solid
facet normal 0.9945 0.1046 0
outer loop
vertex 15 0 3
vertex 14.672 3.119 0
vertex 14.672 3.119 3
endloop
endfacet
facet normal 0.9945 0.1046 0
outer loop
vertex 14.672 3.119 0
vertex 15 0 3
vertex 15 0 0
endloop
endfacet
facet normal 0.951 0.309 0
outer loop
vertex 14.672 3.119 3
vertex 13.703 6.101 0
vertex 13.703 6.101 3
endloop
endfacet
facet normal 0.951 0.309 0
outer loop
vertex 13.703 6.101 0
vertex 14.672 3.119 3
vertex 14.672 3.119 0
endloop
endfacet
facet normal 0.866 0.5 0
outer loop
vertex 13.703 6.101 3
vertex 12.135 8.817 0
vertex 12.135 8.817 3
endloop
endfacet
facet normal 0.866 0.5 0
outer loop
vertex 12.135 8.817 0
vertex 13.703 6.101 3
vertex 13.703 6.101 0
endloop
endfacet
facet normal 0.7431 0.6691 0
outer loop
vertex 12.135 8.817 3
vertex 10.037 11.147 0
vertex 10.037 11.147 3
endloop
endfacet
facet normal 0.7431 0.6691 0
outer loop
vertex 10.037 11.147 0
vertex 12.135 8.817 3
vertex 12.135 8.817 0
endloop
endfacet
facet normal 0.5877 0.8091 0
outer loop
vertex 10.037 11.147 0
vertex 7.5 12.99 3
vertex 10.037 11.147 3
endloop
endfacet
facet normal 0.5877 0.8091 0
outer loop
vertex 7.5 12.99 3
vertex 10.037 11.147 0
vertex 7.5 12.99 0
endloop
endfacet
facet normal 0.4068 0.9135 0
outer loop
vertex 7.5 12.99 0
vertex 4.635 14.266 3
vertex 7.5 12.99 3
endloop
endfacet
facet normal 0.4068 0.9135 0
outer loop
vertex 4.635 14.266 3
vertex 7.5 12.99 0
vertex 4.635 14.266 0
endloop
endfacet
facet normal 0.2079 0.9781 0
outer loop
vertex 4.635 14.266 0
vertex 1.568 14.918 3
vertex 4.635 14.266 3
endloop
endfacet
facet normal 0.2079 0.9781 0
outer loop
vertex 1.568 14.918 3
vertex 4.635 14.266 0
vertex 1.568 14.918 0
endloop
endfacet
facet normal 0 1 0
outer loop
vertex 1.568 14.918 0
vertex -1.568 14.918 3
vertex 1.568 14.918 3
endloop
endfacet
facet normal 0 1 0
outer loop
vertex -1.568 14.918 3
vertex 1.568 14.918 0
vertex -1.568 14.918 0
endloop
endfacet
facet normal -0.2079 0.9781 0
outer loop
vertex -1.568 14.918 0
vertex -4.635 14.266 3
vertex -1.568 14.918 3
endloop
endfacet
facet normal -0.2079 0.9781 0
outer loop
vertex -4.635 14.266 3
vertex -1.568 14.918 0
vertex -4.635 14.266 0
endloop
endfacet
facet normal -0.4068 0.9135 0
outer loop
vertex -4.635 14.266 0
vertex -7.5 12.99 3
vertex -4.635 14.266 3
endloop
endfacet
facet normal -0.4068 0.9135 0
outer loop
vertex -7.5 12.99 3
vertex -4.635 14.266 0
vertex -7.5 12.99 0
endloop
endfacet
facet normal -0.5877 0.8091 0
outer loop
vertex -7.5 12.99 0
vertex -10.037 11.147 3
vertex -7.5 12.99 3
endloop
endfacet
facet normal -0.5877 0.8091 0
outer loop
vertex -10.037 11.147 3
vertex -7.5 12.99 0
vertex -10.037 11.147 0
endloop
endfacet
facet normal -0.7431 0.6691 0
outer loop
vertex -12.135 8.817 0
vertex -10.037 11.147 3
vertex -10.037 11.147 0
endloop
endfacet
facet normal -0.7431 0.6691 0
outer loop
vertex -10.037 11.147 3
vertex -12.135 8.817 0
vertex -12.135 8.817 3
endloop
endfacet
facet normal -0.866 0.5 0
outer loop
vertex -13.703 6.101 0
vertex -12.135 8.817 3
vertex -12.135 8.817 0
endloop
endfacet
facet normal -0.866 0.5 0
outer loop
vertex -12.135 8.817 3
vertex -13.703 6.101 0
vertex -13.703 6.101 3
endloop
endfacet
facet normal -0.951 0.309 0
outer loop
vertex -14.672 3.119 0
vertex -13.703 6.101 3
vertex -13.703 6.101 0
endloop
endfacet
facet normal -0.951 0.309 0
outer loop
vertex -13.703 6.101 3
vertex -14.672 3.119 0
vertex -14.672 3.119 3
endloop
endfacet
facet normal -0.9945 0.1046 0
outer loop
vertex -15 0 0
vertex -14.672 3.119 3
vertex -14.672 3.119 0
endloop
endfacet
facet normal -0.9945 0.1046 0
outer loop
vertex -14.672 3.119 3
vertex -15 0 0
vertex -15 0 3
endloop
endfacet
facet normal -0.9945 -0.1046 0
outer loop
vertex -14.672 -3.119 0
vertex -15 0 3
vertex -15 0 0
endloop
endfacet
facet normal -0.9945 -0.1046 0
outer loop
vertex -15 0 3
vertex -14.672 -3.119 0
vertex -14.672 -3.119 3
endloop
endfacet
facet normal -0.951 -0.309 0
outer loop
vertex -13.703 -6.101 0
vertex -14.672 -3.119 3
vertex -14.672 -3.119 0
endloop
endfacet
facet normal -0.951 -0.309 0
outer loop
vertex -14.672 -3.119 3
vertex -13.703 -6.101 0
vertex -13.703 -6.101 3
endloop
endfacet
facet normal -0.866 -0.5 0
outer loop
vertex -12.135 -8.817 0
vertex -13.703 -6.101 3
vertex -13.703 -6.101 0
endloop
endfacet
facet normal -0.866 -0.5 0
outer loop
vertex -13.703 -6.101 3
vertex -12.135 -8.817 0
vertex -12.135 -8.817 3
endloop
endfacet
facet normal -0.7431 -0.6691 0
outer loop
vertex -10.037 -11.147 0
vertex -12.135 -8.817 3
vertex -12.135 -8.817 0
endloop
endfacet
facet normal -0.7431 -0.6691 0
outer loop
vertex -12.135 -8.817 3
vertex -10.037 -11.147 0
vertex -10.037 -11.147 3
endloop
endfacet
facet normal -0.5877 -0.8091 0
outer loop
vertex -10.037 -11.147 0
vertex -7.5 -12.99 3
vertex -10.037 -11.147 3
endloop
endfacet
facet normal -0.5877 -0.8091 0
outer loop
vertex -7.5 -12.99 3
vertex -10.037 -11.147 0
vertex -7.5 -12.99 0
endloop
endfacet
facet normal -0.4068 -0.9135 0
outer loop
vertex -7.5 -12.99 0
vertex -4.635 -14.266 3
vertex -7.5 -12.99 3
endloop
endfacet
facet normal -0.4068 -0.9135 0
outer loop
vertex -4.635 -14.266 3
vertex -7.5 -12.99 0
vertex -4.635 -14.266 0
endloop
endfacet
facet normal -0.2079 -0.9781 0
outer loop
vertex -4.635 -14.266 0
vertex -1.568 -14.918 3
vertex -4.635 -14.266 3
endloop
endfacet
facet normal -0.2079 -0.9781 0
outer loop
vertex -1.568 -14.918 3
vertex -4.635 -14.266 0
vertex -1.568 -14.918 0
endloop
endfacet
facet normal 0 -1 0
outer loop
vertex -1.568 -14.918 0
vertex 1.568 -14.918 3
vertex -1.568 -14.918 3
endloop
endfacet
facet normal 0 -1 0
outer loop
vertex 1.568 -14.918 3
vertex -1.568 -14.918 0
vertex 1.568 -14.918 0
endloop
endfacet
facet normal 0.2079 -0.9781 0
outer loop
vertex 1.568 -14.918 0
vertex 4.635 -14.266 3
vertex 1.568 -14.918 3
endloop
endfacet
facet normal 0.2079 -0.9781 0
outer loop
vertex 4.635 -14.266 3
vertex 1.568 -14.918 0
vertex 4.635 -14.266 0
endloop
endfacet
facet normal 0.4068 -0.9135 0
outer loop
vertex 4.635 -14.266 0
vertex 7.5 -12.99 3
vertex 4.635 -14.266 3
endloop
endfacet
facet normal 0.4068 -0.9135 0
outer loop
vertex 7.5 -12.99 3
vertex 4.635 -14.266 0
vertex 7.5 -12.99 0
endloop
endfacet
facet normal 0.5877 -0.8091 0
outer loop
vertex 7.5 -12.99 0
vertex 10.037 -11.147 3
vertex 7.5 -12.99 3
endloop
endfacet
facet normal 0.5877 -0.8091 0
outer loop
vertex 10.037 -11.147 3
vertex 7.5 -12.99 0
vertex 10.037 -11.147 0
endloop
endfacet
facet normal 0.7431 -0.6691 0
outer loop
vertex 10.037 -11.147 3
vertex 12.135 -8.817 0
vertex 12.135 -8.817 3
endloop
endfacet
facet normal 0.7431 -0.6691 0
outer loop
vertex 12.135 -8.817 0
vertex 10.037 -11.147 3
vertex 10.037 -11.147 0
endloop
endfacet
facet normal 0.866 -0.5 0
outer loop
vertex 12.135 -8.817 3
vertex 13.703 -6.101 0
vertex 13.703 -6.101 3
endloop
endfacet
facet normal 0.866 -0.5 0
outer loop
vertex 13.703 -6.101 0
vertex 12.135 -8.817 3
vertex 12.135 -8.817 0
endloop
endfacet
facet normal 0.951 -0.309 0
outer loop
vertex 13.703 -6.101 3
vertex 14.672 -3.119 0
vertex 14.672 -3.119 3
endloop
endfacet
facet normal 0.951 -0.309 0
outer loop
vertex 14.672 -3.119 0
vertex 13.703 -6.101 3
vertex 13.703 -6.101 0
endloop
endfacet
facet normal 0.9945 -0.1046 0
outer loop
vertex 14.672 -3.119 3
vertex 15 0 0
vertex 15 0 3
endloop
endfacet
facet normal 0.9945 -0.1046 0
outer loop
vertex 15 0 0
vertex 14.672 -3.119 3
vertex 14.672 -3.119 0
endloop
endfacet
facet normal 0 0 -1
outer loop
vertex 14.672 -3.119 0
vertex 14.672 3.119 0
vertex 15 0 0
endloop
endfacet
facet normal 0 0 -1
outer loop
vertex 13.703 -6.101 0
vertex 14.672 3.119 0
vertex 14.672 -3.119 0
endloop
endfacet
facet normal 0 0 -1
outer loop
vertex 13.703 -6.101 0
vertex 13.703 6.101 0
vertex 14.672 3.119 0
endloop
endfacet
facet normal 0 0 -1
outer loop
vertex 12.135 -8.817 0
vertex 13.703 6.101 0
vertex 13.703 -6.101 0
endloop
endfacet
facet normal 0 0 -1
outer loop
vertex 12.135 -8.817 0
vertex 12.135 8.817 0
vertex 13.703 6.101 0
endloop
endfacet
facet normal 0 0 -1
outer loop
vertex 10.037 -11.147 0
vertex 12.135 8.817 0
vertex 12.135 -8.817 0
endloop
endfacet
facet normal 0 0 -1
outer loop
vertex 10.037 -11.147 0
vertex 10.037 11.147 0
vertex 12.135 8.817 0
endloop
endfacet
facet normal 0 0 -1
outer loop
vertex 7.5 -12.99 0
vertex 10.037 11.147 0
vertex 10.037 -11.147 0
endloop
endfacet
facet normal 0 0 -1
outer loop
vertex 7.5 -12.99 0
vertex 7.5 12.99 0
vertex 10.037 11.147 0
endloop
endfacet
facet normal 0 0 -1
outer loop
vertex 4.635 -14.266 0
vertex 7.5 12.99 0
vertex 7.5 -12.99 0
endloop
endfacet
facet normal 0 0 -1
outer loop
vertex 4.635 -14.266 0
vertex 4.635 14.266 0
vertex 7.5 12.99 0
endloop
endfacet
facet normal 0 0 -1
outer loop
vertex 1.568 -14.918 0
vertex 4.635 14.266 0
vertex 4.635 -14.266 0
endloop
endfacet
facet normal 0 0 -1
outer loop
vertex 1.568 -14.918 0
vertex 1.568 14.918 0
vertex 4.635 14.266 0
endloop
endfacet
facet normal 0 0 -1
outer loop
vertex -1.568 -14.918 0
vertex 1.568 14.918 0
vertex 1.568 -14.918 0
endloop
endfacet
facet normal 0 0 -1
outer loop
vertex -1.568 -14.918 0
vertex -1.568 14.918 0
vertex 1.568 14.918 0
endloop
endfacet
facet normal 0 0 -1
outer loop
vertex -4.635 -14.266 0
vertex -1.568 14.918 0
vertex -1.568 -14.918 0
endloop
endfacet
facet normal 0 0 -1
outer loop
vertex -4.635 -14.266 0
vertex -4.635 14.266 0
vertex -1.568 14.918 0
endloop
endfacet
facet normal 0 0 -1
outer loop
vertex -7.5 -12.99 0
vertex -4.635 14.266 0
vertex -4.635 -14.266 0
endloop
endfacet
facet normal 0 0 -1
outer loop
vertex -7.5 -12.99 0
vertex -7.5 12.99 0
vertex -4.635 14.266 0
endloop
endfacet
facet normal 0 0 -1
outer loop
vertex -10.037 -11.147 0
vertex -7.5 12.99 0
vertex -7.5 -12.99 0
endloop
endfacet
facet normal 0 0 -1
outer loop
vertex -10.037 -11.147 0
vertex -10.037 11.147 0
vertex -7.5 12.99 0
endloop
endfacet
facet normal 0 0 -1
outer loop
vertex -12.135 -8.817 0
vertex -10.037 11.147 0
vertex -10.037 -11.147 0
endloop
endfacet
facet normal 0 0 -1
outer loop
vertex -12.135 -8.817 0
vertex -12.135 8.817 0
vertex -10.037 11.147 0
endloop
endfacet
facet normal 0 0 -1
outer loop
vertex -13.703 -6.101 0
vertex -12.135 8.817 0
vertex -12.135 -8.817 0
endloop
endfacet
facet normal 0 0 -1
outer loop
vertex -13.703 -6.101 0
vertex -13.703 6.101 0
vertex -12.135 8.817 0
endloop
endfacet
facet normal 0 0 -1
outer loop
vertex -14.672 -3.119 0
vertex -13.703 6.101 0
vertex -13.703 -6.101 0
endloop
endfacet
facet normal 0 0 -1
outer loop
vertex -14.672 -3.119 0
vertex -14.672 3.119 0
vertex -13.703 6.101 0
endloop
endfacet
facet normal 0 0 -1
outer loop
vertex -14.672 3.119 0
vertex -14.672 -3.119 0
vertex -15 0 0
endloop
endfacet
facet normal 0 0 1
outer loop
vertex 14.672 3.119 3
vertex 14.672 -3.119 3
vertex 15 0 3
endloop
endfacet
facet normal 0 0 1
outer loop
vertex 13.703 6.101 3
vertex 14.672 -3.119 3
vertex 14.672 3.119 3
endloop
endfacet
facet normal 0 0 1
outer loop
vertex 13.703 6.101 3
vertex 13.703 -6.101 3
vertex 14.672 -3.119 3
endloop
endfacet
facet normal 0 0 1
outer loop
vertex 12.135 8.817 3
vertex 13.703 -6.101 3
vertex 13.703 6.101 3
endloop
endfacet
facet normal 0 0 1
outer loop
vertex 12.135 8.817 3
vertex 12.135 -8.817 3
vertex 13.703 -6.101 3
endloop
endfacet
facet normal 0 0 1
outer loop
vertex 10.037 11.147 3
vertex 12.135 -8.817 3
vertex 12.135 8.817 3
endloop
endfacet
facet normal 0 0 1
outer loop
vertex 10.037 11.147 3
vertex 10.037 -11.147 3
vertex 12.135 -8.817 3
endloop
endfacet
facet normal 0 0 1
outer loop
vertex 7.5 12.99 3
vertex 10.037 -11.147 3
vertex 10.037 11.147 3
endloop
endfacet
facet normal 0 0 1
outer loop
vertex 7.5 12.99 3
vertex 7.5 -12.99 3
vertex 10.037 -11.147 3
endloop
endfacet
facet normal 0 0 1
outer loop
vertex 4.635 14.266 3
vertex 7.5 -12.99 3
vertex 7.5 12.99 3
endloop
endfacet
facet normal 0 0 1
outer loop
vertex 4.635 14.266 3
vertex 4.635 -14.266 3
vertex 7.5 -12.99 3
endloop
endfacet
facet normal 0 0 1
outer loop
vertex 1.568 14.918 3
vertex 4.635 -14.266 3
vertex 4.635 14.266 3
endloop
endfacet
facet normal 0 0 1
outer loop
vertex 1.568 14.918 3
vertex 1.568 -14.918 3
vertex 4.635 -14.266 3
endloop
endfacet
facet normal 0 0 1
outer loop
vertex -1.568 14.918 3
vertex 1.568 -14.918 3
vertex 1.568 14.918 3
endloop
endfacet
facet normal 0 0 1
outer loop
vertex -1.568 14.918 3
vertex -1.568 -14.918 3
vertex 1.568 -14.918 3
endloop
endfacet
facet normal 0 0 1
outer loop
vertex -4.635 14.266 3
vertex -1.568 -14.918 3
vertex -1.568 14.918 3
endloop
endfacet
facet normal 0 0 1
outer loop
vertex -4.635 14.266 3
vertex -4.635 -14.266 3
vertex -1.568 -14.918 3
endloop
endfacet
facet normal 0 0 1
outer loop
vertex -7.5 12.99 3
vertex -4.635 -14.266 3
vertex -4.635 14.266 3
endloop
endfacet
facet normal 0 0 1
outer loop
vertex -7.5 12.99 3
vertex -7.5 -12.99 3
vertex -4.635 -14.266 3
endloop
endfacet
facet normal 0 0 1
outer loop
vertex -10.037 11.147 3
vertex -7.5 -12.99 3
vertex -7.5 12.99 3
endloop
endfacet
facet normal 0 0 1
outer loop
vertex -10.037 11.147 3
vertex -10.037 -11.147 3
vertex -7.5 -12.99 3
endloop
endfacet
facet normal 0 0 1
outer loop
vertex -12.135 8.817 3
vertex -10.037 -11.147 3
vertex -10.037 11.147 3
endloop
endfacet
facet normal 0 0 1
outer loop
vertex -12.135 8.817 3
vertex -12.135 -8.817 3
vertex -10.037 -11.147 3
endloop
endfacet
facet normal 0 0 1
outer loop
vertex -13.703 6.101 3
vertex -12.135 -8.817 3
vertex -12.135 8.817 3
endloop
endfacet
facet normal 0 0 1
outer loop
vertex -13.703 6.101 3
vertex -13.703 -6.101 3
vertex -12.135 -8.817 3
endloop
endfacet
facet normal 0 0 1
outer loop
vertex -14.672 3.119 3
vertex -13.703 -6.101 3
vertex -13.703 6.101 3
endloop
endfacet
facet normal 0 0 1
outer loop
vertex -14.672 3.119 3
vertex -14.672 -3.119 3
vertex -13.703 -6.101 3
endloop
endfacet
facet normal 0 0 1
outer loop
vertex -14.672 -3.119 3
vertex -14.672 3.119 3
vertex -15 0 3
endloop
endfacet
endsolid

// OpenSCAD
// Generated by SolidPython 1.0.1 on 2020-07-29 00:39:25


cylinder(h = 3, r1 = 15, r2 = 15);
/***********************************************
*********      SolidPython code:      **********
************************************************
 
# import packages: SolidPython
from solid import *
from solid.utils import *
from itertools import chain, combinations


class Resize:

    def __init__(self, scad_file):
        self.scad_file = scad_file
        #self.scad_file = import_scad(scad_file)
        # cone/cylinder param:
        self.r1 = 0
        self.r2 = 0
        self.h = 0
        # rectangular prism param:
        self.w = 0
        self.l = 0
        # ellipse param:
        self.r = 0

    # import OpenScad code (file name corresponds to shape)


    # classify shape + parameters
    def assign(self, param1, param2, param3):
        if self.scad_file == 'cone.scad':
            self.r1 = param1
            self.r2 = param2
            self.h = param3
        elif self.scad_file == 'cylinder.scad':
            self.r1 = param1
            self.r2 = param2
            self.h = param3
        elif self.scad_file == 'rectangularPrism.scad':
            self.h = param1
            self.l = param2
            self.w = param3
        else:
            self.r = param1
            self.h = param2

    # resize parameters
    def iterate(self):
        x = range(3, 20, 2)
        i = 1
        if self.scad_file == 'cone.scad':
            tempList = list(combinations(x, 2))
            for temp in tempList:
                param1 = temp[0]
                param2 = temp[1]
                filepath = 'produced_scad_files/' + 'cone' + str(param1) + '_' + str(param2) + '_' + '.scad'
                scad_render_to_file(cylinder(h=param1, r1=param2, r2=0), filepath)

        elif self.scad_file == 'cylinder.scad':
            tempList = list(combinations(x, 3))
            for temp in tempList:
                param1 = temp[0]
                param2 = temp[1]
                filepath = 'produced_scad_files/' + 'cylinder' + str(param1) + '_' + str(param2) + '_' + '.scad'
                scad_render_to_file(cylinder(h=param1, r1=param2, r2=param2), filepath)

        elif self.scad_file == 'rectangularPrism.scad':
            tempList = list(combinations(x, 3))
            for temp in tempList:
                param1 = temp[0]
                param2 = temp[1]
                param3 = temp[2]
                filepath = 'produced_scad_files/' + 'rectangularPrism' + str(param1) + '_' + str(param2) + '_' + str(
                    param3) + '.scad'
                scad_render_to_file(cube(size=(param1, param2, param3)), filepath)

        elif self.scad_file == 'ellipse.scad':
            tempList = list(combinations(x, 4))
            for temp in tempList:
                param1 = temp[0]
                param2 = temp[1]
                param3 = temp[2]
                param4 = temp[3]
                filepath = 'produced_scad_files/' + 'ellipse' + str(param1) + '_' + str(param2) + '_' + str(param3) + '_' + str(param4) + '.scad'
                scad_render_to_file(scale([param1, param2, param3])(sphere(r=param4)), filepath)

    def render_to_scadfile(self):
        scad_render_to_file(scad, 'example.scad') 
 
************************************************/
